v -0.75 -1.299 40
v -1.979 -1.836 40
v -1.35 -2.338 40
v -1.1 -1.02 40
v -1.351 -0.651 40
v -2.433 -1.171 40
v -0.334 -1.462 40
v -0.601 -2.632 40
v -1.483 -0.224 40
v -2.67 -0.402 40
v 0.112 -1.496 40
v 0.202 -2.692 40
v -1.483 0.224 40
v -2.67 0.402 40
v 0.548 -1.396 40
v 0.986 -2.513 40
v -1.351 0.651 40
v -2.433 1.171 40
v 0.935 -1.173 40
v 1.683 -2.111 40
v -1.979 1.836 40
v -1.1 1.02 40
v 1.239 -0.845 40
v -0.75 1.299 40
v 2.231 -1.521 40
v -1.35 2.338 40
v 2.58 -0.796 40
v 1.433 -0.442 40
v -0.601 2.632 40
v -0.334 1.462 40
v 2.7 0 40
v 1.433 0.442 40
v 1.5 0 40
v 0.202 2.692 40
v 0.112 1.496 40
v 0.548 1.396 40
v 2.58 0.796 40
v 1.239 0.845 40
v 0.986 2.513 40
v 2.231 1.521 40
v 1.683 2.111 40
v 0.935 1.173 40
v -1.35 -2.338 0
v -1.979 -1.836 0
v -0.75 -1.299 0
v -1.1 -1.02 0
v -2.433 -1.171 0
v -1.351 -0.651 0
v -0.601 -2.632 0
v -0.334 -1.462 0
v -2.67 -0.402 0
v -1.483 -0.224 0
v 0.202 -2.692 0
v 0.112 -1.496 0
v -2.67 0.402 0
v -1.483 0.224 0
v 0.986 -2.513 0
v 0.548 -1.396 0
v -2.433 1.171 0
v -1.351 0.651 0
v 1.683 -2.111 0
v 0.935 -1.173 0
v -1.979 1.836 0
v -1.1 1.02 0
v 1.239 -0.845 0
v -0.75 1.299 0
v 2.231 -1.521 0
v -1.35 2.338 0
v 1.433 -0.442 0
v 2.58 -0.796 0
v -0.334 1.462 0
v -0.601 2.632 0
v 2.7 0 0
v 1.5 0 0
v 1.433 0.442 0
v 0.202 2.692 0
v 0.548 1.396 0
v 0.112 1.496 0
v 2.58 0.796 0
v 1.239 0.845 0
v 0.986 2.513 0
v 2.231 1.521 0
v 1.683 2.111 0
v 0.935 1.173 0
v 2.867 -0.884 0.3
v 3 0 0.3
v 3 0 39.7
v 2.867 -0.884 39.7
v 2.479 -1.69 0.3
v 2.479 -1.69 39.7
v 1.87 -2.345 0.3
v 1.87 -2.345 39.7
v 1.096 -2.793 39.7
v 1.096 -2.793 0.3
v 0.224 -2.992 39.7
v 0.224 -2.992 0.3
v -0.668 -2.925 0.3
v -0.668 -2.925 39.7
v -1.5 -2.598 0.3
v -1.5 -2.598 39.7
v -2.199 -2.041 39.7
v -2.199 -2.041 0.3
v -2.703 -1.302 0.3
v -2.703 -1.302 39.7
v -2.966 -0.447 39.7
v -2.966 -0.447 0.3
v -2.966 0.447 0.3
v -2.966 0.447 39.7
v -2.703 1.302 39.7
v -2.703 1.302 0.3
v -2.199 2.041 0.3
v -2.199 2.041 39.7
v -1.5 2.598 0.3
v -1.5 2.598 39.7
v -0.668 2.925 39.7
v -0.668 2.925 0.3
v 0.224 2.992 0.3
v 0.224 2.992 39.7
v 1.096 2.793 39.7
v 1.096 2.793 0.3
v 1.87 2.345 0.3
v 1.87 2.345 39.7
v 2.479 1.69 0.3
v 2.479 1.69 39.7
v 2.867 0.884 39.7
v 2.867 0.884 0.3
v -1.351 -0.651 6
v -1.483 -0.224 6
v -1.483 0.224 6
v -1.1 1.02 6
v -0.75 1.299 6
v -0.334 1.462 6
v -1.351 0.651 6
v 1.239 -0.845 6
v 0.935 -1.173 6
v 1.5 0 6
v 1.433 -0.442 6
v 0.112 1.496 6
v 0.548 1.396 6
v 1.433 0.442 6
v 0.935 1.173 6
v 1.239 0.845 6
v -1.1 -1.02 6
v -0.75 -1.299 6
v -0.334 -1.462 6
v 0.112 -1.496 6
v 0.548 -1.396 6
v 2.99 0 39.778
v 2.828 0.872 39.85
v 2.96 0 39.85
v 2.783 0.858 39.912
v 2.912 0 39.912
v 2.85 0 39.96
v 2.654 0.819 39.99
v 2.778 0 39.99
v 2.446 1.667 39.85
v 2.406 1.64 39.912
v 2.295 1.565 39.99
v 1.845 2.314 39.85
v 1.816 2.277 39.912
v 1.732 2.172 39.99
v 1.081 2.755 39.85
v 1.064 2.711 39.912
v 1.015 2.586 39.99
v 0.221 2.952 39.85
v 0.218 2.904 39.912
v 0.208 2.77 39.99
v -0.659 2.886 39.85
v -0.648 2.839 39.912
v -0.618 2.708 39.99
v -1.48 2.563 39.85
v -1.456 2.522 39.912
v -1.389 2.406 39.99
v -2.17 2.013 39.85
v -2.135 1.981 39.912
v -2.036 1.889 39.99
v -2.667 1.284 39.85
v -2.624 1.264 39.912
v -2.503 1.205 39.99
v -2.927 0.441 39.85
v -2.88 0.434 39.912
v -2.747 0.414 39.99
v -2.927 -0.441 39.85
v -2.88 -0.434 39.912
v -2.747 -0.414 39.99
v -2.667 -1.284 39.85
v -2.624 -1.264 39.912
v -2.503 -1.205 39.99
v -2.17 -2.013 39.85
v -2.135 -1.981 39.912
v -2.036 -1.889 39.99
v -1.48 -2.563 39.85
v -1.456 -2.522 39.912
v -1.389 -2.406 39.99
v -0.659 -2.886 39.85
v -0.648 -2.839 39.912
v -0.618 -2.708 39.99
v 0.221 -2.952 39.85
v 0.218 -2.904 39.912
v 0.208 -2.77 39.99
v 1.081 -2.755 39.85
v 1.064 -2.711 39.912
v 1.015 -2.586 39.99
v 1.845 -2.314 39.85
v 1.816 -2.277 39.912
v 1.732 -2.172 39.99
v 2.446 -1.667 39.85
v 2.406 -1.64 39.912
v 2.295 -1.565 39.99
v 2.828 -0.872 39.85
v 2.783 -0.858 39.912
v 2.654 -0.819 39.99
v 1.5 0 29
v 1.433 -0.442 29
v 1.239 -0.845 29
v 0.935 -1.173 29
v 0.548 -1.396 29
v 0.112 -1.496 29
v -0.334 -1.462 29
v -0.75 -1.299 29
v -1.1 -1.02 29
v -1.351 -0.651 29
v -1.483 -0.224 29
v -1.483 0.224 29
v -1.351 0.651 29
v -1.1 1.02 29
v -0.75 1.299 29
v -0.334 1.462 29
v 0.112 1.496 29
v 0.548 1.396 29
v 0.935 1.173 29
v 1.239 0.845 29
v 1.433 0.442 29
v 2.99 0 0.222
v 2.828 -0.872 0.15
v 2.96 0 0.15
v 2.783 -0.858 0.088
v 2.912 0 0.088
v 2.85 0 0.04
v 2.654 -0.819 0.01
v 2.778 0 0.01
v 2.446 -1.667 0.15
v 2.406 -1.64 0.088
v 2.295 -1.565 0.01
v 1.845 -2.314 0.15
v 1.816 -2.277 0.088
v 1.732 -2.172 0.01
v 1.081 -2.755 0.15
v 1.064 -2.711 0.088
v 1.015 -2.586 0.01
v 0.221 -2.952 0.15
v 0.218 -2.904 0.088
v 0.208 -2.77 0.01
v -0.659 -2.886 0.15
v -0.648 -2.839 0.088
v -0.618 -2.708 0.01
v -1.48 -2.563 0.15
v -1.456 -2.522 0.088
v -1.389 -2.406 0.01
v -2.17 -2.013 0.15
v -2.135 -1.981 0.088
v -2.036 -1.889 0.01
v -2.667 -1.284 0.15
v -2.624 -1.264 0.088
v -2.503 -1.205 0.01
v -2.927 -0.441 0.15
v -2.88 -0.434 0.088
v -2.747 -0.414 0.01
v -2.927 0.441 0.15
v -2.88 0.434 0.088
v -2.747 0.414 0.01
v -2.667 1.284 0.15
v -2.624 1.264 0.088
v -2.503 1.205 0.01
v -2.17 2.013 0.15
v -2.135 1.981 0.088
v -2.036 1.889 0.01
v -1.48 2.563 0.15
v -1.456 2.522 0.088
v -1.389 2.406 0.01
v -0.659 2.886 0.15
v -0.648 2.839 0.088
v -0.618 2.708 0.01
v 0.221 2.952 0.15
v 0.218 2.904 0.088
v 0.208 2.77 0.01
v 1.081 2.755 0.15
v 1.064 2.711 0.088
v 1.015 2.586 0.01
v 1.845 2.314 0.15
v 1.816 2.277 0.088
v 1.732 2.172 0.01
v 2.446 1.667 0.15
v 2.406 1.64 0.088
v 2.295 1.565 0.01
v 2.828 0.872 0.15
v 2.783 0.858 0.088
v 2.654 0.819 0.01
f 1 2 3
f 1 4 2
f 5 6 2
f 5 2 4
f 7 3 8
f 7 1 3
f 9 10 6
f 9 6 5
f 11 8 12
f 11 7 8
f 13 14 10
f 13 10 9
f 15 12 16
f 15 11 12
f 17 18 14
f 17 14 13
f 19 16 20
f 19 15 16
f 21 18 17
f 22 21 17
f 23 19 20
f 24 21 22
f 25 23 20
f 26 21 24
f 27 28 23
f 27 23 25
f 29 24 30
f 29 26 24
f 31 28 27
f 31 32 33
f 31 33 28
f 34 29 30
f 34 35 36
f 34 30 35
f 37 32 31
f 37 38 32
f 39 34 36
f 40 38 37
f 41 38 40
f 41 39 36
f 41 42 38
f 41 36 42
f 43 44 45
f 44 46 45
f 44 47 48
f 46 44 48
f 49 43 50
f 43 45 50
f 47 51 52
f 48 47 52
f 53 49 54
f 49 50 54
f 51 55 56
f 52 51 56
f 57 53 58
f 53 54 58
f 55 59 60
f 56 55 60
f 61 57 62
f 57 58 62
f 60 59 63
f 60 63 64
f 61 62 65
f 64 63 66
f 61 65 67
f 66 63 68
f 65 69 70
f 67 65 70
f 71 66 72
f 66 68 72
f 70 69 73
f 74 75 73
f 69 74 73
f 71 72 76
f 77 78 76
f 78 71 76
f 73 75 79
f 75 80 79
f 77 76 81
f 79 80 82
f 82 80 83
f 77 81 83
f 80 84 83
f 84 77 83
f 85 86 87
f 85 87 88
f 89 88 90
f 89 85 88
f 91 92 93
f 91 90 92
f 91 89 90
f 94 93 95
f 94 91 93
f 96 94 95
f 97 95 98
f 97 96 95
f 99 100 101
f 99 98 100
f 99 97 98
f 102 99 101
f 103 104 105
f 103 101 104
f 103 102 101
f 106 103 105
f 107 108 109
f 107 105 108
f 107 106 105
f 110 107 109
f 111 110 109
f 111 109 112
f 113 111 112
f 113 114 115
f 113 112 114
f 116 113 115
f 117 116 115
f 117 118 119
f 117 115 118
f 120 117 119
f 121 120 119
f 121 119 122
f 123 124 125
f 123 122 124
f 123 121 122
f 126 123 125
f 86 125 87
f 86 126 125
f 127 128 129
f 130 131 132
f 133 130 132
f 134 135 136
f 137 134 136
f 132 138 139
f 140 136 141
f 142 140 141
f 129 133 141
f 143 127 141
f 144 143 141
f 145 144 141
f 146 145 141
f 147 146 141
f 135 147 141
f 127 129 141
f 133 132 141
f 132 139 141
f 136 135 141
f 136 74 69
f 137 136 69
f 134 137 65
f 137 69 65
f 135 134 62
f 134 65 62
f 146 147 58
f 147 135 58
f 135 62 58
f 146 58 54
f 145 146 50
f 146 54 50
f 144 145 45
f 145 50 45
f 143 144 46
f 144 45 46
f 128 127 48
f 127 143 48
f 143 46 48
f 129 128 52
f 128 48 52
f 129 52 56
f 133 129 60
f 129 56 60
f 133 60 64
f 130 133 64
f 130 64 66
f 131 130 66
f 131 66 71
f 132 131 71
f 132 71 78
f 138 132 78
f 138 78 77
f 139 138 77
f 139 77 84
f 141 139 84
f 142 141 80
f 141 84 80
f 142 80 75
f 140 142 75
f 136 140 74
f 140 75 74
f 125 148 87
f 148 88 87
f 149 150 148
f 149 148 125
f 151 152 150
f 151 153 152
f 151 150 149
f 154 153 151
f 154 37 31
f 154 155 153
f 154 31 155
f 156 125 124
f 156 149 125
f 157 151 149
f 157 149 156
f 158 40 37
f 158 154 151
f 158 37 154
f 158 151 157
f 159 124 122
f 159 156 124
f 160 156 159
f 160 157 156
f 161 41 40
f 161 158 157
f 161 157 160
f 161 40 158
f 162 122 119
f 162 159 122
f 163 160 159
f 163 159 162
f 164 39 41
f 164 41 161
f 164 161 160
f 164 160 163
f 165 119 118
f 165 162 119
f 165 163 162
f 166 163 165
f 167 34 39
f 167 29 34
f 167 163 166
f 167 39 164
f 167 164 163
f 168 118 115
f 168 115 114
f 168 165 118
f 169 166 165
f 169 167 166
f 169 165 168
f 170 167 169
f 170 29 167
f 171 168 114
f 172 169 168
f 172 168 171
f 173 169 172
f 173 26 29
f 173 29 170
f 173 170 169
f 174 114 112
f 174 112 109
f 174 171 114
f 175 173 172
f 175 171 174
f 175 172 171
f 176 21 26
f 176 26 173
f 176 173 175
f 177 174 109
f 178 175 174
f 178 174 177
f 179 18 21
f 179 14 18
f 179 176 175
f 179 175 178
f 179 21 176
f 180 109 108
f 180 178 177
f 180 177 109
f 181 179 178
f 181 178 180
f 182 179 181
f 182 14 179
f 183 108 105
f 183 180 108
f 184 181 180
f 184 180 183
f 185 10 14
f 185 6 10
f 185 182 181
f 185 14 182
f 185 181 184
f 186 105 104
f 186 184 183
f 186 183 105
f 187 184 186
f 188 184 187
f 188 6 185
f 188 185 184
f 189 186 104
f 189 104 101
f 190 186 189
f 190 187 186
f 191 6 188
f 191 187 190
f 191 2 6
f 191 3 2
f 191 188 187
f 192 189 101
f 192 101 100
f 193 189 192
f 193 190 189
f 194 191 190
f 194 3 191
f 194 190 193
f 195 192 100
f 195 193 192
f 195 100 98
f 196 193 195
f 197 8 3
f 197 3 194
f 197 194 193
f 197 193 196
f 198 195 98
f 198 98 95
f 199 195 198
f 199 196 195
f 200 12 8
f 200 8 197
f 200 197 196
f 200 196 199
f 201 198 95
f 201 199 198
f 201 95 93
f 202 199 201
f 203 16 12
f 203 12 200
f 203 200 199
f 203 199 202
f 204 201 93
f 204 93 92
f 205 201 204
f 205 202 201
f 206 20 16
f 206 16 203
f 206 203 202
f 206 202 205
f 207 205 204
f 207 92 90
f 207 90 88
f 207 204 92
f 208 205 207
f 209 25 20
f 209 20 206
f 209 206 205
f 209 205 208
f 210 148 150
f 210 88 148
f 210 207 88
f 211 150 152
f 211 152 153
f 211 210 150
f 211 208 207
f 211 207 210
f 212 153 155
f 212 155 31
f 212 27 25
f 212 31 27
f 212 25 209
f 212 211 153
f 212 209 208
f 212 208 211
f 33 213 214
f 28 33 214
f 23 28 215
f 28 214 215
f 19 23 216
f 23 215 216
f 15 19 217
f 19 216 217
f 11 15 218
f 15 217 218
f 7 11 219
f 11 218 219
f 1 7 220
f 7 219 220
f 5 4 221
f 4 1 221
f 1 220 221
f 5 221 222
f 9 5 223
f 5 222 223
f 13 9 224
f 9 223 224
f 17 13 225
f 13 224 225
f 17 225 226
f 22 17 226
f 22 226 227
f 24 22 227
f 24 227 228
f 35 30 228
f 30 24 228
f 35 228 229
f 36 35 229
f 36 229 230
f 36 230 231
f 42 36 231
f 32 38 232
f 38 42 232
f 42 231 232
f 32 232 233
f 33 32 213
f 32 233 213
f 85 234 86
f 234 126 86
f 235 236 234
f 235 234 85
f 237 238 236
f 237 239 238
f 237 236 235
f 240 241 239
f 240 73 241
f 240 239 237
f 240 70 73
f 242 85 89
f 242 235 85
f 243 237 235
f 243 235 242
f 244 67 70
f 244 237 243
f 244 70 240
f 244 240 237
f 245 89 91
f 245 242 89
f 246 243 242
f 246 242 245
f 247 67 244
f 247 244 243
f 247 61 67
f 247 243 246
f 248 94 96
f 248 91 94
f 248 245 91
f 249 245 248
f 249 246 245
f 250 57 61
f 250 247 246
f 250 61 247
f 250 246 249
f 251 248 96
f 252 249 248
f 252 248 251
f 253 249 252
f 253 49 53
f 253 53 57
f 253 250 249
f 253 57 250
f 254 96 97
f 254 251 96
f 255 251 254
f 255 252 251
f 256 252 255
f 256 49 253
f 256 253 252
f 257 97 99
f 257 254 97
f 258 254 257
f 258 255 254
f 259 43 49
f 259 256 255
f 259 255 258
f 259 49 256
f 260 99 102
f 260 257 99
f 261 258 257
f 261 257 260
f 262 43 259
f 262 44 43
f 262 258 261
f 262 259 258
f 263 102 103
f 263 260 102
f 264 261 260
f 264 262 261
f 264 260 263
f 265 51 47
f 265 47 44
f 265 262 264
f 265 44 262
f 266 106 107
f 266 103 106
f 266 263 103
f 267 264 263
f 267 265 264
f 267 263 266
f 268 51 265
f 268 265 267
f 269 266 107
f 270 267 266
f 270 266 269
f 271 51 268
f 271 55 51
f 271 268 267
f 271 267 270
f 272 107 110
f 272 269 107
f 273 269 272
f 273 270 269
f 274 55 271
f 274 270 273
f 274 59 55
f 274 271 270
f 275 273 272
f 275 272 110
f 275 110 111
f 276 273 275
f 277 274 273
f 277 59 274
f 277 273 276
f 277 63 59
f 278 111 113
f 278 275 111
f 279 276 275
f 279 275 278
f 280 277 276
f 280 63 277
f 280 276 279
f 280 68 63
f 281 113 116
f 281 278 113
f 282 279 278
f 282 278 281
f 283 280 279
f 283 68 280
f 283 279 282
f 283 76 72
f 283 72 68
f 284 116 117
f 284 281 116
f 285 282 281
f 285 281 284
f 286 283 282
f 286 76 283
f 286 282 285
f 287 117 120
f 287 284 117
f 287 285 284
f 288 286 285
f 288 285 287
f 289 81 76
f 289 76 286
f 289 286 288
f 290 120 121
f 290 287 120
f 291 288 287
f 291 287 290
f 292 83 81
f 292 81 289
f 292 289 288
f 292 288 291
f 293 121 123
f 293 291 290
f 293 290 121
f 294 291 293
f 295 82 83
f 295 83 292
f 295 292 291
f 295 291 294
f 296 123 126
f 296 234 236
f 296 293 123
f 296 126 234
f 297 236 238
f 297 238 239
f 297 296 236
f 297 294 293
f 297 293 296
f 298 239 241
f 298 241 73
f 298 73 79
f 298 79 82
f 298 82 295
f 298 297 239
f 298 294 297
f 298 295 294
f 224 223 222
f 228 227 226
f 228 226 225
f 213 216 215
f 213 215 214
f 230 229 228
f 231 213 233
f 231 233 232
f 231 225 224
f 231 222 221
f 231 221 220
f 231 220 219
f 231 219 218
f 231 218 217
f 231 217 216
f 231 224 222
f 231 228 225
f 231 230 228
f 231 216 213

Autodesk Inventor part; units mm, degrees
ref_plane "YZ Plane" through (0, 0, 0) normal (1, 0, 0) x (0, 1, 0)
ref_plane "XZ Plane" through (0, 0, 0) normal (0, 1, 0) x (-1, 0, 0)
ref_plane "XY Plane" through (0, 0, 0) normal (0, 0, 1) x (1, 0, 0)
sketch "スケッチ1" plane through (0, 0, 0) normal (0, 0, 1) x (1, 0, 0)
  circle A0 centre (0, 0) radius 3
  circle A1 centre (0, 0) radius 1.5
  dimension "d0" = 6
  dimension "d1" = 3
extrude "押し出し1" add sketch "スケッチ1" along normal blind 40
fillet "フィレット1" radius 0.3 2 edges at (-3, 0, 40) (-3, 0, 0)
thread "ねじ1" size "M3x0.5" class "6H" standard "ANSI Metric M Profile" length 100
extrude "押し出し2" add sketch "スケッチ1" along normal blind 29 contours A1
extrude "押し出し3" cut sketch "スケッチ1" along normal blind 6 contours A1
thread "ねじ2" size "M3x0.5" class "6H" standard "ANSI Metric M Profile" full length
properties part number "スペーサーM3L40アルミ" material "アルミニウム 2014-T4"
